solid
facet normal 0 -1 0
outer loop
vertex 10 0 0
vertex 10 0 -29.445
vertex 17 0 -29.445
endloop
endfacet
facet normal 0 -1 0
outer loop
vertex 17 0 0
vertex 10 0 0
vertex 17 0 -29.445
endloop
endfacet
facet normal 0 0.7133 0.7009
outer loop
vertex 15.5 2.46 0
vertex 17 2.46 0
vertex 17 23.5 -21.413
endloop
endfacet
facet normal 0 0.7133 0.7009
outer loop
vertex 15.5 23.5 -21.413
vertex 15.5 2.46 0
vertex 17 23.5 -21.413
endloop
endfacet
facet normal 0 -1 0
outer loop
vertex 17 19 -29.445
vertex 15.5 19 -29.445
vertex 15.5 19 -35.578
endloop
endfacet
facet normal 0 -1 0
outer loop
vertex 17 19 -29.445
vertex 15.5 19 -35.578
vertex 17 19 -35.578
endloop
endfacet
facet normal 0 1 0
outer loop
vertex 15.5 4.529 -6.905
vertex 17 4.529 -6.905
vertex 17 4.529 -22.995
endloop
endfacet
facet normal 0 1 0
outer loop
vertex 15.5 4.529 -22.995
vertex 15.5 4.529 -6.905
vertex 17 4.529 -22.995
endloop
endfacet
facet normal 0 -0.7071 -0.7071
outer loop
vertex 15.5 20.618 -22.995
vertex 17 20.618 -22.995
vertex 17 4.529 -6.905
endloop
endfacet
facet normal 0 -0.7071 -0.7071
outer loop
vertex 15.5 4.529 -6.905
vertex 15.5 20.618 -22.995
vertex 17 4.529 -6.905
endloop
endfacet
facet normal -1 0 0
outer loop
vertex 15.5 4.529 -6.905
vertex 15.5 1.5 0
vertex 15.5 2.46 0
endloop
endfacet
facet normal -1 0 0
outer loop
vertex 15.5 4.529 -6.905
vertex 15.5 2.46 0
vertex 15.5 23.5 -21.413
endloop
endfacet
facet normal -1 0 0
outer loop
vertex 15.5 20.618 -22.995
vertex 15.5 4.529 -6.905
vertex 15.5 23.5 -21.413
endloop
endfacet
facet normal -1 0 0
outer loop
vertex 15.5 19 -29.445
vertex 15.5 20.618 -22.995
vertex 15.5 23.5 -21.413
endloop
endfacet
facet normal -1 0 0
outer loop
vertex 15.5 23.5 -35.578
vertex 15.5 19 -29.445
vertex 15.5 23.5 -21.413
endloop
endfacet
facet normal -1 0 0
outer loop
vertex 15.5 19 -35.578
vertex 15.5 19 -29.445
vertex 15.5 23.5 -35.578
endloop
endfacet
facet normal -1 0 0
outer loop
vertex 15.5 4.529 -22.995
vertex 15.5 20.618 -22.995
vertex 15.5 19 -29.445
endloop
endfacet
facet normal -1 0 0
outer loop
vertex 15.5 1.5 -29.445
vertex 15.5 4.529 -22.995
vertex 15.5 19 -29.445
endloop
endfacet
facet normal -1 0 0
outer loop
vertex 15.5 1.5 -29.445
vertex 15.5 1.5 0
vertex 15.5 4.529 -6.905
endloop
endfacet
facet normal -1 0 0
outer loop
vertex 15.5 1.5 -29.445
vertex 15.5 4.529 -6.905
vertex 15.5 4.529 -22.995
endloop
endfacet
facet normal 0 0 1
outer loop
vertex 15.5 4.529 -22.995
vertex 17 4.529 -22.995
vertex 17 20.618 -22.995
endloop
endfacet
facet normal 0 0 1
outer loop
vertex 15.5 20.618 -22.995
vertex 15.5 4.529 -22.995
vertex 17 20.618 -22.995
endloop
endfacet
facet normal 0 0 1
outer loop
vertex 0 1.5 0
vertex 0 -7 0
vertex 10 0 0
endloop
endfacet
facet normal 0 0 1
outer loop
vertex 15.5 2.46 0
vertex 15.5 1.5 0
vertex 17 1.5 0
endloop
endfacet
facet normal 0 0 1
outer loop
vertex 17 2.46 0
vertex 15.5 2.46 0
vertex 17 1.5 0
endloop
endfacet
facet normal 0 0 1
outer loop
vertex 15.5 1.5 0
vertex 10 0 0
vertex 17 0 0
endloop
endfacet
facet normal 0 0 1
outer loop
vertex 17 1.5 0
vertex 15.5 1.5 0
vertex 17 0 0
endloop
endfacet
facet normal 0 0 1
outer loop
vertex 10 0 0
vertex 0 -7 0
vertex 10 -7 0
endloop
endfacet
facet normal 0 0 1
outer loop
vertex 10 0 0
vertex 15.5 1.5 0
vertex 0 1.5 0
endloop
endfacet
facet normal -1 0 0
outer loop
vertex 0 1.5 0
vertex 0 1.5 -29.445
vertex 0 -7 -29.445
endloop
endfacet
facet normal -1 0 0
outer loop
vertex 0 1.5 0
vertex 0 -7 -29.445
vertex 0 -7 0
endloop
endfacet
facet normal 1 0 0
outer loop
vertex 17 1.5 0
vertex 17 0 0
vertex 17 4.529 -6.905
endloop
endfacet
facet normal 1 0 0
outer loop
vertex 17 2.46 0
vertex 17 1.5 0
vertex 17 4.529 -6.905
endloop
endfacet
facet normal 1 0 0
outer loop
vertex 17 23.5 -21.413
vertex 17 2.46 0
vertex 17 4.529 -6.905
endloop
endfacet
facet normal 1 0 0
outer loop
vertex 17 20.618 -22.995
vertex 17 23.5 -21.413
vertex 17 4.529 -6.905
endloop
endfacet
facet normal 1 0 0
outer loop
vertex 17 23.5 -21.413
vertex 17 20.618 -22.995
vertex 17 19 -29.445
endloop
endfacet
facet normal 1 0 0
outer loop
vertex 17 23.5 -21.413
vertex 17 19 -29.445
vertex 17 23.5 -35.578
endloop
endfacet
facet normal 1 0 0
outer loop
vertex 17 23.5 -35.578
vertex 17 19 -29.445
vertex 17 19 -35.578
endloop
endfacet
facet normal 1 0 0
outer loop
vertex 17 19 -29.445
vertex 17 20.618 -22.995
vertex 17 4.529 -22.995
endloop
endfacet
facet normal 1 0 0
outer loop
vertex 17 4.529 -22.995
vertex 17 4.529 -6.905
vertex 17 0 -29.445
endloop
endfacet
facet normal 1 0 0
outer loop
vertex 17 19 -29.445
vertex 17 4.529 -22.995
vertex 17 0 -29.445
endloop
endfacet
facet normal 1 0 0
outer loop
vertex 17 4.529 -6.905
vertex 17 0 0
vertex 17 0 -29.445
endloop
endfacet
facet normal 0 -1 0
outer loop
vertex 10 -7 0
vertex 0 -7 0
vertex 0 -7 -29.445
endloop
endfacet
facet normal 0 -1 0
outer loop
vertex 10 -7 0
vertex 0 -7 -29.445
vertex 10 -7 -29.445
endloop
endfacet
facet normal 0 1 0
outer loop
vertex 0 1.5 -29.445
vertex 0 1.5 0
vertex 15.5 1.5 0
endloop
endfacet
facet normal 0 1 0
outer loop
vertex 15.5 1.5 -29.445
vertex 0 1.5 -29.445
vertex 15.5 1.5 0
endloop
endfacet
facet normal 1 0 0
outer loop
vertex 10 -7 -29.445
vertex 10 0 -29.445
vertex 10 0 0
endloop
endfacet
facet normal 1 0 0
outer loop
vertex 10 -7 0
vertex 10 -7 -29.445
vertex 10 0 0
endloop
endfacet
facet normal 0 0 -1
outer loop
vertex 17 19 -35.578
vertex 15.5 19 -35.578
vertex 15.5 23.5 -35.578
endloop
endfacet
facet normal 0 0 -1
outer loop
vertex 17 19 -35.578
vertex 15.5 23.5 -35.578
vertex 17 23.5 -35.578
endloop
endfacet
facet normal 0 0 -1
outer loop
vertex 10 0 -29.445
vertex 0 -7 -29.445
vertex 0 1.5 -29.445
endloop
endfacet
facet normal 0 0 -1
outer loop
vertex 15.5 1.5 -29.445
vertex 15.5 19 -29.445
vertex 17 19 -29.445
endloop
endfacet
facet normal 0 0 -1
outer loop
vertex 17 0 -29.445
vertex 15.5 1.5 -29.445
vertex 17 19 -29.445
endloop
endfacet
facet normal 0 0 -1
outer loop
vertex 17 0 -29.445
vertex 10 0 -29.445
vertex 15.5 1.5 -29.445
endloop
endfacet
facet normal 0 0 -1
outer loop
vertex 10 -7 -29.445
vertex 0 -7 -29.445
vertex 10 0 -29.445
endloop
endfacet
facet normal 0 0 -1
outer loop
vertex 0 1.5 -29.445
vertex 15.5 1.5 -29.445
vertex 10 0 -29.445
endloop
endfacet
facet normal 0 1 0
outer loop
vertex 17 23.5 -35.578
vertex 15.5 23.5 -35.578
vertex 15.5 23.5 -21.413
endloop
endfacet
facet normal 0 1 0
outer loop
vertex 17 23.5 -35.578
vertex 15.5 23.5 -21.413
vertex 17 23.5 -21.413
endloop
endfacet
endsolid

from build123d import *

# Parameters (mm, degrees)
SKETCH_2_W          = 17
SKETCH_2_H          = 35
EXTRUDE_1_DEPTH     = 1.5
SKETCH_3_W          = 10
SKETCH_3_H          = 35
EXTRUDE_2_DEPTH     = 7
SKETCH_4_W          = 1.5
SKETCH_4_H          = 35.577657925
EXTRUDE_3_DEPTH     = 22
CUT_EXTRUDE_1_REACH = 47.902
CUT_EXTRUDE_2_REACH = 47.902
SKETCH_11_W         = 17
SKETCH_11_H         = 6.846873931
CUT_EXTRUDE_7_DEPTH = 26


with BuildPart() as part:
    # 草图2 → 凸台-拉伸1 (new body)
    with BuildSketch(Plane(origin=(0, 0, 0), x_dir=(1, 0, 0), z_dir=(0, 1, 0))):
        with Locations((8.5, 17.5)):
            Rectangle(SKETCH_2_W, SKETCH_2_H)
    extrude(amount=EXTRUDE_1_DEPTH)

    # 草图3 → 凸台-拉伸2 (add)
    with BuildSketch(Plane.XZ):
        with Locations((5, -17.5)):
            Rectangle(SKETCH_3_W, SKETCH_3_H)
    extrude(amount=EXTRUDE_2_DEPTH)

    # 草图4 → 凸台-拉伸3 (add)
    with BuildSketch(Plane(origin=(0, 1.5, 0), x_dir=(1, 0, 0), z_dir=(0, 1, 0))):
        with Locations((16.25, 17.788828963)):
            Rectangle(SKETCH_4_W, SKETCH_4_H)
    extrude(amount=EXTRUDE_3_DEPTH)

    # 草图7 → 切除-拉伸1 (cut, up to next)
    with BuildSketch(Plane(origin=(17, 0, 0), x_dir=(0, 0, -1), z_dir=(1, 0, 0)), mode=Mode.PRIVATE) as cut_extrude_1_sk1:
        Polygon((0, 23.5), (0, 2.460497923), (21.413333868, 23.5), align=None)
    cut_extrude_1_tool1 = extrude(cut_extrude_1_sk1.sketch, amount=-CUT_EXTRUDE_1_REACH, mode=Mode.PRIVATE) & part.part
    add(cut_extrude_1_tool1.solids().sort_by_distance((17, 16.486833, -7.137778))[0], mode=Mode.SUBTRACT)

    # 草图8 → 切除-拉伸2 (cut, up to next)
    with BuildSketch(Plane(origin=(17, 0, 0), x_dir=(0, 0, -1), z_dir=(1, 0, 0)), mode=Mode.PRIVATE) as cut_extrude_2_sk1:
        Polygon((22.994680785, 20.618265403), (6.90545418, 4.529038798), (22.994680785, 4.529038798), align=None)
    cut_extrude_2_tool1 = extrude(cut_extrude_2_sk1.sketch, amount=-CUT_EXTRUDE_2_REACH, mode=Mode.PRIVATE) & part.part
    add(cut_extrude_2_tool1.solids().sort_by_distance((17, 9.892114, -17.631605))[0], mode=Mode.SUBTRACT)

    # 草图11 → 切除-拉伸7 (cut)
    with BuildSketch(Plane.XZ.offset(7)):
        with Locations((8.5, -32.86825369)):
            Rectangle(SKETCH_11_W, SKETCH_11_H)
    extrude(amount=-CUT_EXTRUDE_7_DEPTH, mode=Mode.SUBTRACT)


solid = part.part
